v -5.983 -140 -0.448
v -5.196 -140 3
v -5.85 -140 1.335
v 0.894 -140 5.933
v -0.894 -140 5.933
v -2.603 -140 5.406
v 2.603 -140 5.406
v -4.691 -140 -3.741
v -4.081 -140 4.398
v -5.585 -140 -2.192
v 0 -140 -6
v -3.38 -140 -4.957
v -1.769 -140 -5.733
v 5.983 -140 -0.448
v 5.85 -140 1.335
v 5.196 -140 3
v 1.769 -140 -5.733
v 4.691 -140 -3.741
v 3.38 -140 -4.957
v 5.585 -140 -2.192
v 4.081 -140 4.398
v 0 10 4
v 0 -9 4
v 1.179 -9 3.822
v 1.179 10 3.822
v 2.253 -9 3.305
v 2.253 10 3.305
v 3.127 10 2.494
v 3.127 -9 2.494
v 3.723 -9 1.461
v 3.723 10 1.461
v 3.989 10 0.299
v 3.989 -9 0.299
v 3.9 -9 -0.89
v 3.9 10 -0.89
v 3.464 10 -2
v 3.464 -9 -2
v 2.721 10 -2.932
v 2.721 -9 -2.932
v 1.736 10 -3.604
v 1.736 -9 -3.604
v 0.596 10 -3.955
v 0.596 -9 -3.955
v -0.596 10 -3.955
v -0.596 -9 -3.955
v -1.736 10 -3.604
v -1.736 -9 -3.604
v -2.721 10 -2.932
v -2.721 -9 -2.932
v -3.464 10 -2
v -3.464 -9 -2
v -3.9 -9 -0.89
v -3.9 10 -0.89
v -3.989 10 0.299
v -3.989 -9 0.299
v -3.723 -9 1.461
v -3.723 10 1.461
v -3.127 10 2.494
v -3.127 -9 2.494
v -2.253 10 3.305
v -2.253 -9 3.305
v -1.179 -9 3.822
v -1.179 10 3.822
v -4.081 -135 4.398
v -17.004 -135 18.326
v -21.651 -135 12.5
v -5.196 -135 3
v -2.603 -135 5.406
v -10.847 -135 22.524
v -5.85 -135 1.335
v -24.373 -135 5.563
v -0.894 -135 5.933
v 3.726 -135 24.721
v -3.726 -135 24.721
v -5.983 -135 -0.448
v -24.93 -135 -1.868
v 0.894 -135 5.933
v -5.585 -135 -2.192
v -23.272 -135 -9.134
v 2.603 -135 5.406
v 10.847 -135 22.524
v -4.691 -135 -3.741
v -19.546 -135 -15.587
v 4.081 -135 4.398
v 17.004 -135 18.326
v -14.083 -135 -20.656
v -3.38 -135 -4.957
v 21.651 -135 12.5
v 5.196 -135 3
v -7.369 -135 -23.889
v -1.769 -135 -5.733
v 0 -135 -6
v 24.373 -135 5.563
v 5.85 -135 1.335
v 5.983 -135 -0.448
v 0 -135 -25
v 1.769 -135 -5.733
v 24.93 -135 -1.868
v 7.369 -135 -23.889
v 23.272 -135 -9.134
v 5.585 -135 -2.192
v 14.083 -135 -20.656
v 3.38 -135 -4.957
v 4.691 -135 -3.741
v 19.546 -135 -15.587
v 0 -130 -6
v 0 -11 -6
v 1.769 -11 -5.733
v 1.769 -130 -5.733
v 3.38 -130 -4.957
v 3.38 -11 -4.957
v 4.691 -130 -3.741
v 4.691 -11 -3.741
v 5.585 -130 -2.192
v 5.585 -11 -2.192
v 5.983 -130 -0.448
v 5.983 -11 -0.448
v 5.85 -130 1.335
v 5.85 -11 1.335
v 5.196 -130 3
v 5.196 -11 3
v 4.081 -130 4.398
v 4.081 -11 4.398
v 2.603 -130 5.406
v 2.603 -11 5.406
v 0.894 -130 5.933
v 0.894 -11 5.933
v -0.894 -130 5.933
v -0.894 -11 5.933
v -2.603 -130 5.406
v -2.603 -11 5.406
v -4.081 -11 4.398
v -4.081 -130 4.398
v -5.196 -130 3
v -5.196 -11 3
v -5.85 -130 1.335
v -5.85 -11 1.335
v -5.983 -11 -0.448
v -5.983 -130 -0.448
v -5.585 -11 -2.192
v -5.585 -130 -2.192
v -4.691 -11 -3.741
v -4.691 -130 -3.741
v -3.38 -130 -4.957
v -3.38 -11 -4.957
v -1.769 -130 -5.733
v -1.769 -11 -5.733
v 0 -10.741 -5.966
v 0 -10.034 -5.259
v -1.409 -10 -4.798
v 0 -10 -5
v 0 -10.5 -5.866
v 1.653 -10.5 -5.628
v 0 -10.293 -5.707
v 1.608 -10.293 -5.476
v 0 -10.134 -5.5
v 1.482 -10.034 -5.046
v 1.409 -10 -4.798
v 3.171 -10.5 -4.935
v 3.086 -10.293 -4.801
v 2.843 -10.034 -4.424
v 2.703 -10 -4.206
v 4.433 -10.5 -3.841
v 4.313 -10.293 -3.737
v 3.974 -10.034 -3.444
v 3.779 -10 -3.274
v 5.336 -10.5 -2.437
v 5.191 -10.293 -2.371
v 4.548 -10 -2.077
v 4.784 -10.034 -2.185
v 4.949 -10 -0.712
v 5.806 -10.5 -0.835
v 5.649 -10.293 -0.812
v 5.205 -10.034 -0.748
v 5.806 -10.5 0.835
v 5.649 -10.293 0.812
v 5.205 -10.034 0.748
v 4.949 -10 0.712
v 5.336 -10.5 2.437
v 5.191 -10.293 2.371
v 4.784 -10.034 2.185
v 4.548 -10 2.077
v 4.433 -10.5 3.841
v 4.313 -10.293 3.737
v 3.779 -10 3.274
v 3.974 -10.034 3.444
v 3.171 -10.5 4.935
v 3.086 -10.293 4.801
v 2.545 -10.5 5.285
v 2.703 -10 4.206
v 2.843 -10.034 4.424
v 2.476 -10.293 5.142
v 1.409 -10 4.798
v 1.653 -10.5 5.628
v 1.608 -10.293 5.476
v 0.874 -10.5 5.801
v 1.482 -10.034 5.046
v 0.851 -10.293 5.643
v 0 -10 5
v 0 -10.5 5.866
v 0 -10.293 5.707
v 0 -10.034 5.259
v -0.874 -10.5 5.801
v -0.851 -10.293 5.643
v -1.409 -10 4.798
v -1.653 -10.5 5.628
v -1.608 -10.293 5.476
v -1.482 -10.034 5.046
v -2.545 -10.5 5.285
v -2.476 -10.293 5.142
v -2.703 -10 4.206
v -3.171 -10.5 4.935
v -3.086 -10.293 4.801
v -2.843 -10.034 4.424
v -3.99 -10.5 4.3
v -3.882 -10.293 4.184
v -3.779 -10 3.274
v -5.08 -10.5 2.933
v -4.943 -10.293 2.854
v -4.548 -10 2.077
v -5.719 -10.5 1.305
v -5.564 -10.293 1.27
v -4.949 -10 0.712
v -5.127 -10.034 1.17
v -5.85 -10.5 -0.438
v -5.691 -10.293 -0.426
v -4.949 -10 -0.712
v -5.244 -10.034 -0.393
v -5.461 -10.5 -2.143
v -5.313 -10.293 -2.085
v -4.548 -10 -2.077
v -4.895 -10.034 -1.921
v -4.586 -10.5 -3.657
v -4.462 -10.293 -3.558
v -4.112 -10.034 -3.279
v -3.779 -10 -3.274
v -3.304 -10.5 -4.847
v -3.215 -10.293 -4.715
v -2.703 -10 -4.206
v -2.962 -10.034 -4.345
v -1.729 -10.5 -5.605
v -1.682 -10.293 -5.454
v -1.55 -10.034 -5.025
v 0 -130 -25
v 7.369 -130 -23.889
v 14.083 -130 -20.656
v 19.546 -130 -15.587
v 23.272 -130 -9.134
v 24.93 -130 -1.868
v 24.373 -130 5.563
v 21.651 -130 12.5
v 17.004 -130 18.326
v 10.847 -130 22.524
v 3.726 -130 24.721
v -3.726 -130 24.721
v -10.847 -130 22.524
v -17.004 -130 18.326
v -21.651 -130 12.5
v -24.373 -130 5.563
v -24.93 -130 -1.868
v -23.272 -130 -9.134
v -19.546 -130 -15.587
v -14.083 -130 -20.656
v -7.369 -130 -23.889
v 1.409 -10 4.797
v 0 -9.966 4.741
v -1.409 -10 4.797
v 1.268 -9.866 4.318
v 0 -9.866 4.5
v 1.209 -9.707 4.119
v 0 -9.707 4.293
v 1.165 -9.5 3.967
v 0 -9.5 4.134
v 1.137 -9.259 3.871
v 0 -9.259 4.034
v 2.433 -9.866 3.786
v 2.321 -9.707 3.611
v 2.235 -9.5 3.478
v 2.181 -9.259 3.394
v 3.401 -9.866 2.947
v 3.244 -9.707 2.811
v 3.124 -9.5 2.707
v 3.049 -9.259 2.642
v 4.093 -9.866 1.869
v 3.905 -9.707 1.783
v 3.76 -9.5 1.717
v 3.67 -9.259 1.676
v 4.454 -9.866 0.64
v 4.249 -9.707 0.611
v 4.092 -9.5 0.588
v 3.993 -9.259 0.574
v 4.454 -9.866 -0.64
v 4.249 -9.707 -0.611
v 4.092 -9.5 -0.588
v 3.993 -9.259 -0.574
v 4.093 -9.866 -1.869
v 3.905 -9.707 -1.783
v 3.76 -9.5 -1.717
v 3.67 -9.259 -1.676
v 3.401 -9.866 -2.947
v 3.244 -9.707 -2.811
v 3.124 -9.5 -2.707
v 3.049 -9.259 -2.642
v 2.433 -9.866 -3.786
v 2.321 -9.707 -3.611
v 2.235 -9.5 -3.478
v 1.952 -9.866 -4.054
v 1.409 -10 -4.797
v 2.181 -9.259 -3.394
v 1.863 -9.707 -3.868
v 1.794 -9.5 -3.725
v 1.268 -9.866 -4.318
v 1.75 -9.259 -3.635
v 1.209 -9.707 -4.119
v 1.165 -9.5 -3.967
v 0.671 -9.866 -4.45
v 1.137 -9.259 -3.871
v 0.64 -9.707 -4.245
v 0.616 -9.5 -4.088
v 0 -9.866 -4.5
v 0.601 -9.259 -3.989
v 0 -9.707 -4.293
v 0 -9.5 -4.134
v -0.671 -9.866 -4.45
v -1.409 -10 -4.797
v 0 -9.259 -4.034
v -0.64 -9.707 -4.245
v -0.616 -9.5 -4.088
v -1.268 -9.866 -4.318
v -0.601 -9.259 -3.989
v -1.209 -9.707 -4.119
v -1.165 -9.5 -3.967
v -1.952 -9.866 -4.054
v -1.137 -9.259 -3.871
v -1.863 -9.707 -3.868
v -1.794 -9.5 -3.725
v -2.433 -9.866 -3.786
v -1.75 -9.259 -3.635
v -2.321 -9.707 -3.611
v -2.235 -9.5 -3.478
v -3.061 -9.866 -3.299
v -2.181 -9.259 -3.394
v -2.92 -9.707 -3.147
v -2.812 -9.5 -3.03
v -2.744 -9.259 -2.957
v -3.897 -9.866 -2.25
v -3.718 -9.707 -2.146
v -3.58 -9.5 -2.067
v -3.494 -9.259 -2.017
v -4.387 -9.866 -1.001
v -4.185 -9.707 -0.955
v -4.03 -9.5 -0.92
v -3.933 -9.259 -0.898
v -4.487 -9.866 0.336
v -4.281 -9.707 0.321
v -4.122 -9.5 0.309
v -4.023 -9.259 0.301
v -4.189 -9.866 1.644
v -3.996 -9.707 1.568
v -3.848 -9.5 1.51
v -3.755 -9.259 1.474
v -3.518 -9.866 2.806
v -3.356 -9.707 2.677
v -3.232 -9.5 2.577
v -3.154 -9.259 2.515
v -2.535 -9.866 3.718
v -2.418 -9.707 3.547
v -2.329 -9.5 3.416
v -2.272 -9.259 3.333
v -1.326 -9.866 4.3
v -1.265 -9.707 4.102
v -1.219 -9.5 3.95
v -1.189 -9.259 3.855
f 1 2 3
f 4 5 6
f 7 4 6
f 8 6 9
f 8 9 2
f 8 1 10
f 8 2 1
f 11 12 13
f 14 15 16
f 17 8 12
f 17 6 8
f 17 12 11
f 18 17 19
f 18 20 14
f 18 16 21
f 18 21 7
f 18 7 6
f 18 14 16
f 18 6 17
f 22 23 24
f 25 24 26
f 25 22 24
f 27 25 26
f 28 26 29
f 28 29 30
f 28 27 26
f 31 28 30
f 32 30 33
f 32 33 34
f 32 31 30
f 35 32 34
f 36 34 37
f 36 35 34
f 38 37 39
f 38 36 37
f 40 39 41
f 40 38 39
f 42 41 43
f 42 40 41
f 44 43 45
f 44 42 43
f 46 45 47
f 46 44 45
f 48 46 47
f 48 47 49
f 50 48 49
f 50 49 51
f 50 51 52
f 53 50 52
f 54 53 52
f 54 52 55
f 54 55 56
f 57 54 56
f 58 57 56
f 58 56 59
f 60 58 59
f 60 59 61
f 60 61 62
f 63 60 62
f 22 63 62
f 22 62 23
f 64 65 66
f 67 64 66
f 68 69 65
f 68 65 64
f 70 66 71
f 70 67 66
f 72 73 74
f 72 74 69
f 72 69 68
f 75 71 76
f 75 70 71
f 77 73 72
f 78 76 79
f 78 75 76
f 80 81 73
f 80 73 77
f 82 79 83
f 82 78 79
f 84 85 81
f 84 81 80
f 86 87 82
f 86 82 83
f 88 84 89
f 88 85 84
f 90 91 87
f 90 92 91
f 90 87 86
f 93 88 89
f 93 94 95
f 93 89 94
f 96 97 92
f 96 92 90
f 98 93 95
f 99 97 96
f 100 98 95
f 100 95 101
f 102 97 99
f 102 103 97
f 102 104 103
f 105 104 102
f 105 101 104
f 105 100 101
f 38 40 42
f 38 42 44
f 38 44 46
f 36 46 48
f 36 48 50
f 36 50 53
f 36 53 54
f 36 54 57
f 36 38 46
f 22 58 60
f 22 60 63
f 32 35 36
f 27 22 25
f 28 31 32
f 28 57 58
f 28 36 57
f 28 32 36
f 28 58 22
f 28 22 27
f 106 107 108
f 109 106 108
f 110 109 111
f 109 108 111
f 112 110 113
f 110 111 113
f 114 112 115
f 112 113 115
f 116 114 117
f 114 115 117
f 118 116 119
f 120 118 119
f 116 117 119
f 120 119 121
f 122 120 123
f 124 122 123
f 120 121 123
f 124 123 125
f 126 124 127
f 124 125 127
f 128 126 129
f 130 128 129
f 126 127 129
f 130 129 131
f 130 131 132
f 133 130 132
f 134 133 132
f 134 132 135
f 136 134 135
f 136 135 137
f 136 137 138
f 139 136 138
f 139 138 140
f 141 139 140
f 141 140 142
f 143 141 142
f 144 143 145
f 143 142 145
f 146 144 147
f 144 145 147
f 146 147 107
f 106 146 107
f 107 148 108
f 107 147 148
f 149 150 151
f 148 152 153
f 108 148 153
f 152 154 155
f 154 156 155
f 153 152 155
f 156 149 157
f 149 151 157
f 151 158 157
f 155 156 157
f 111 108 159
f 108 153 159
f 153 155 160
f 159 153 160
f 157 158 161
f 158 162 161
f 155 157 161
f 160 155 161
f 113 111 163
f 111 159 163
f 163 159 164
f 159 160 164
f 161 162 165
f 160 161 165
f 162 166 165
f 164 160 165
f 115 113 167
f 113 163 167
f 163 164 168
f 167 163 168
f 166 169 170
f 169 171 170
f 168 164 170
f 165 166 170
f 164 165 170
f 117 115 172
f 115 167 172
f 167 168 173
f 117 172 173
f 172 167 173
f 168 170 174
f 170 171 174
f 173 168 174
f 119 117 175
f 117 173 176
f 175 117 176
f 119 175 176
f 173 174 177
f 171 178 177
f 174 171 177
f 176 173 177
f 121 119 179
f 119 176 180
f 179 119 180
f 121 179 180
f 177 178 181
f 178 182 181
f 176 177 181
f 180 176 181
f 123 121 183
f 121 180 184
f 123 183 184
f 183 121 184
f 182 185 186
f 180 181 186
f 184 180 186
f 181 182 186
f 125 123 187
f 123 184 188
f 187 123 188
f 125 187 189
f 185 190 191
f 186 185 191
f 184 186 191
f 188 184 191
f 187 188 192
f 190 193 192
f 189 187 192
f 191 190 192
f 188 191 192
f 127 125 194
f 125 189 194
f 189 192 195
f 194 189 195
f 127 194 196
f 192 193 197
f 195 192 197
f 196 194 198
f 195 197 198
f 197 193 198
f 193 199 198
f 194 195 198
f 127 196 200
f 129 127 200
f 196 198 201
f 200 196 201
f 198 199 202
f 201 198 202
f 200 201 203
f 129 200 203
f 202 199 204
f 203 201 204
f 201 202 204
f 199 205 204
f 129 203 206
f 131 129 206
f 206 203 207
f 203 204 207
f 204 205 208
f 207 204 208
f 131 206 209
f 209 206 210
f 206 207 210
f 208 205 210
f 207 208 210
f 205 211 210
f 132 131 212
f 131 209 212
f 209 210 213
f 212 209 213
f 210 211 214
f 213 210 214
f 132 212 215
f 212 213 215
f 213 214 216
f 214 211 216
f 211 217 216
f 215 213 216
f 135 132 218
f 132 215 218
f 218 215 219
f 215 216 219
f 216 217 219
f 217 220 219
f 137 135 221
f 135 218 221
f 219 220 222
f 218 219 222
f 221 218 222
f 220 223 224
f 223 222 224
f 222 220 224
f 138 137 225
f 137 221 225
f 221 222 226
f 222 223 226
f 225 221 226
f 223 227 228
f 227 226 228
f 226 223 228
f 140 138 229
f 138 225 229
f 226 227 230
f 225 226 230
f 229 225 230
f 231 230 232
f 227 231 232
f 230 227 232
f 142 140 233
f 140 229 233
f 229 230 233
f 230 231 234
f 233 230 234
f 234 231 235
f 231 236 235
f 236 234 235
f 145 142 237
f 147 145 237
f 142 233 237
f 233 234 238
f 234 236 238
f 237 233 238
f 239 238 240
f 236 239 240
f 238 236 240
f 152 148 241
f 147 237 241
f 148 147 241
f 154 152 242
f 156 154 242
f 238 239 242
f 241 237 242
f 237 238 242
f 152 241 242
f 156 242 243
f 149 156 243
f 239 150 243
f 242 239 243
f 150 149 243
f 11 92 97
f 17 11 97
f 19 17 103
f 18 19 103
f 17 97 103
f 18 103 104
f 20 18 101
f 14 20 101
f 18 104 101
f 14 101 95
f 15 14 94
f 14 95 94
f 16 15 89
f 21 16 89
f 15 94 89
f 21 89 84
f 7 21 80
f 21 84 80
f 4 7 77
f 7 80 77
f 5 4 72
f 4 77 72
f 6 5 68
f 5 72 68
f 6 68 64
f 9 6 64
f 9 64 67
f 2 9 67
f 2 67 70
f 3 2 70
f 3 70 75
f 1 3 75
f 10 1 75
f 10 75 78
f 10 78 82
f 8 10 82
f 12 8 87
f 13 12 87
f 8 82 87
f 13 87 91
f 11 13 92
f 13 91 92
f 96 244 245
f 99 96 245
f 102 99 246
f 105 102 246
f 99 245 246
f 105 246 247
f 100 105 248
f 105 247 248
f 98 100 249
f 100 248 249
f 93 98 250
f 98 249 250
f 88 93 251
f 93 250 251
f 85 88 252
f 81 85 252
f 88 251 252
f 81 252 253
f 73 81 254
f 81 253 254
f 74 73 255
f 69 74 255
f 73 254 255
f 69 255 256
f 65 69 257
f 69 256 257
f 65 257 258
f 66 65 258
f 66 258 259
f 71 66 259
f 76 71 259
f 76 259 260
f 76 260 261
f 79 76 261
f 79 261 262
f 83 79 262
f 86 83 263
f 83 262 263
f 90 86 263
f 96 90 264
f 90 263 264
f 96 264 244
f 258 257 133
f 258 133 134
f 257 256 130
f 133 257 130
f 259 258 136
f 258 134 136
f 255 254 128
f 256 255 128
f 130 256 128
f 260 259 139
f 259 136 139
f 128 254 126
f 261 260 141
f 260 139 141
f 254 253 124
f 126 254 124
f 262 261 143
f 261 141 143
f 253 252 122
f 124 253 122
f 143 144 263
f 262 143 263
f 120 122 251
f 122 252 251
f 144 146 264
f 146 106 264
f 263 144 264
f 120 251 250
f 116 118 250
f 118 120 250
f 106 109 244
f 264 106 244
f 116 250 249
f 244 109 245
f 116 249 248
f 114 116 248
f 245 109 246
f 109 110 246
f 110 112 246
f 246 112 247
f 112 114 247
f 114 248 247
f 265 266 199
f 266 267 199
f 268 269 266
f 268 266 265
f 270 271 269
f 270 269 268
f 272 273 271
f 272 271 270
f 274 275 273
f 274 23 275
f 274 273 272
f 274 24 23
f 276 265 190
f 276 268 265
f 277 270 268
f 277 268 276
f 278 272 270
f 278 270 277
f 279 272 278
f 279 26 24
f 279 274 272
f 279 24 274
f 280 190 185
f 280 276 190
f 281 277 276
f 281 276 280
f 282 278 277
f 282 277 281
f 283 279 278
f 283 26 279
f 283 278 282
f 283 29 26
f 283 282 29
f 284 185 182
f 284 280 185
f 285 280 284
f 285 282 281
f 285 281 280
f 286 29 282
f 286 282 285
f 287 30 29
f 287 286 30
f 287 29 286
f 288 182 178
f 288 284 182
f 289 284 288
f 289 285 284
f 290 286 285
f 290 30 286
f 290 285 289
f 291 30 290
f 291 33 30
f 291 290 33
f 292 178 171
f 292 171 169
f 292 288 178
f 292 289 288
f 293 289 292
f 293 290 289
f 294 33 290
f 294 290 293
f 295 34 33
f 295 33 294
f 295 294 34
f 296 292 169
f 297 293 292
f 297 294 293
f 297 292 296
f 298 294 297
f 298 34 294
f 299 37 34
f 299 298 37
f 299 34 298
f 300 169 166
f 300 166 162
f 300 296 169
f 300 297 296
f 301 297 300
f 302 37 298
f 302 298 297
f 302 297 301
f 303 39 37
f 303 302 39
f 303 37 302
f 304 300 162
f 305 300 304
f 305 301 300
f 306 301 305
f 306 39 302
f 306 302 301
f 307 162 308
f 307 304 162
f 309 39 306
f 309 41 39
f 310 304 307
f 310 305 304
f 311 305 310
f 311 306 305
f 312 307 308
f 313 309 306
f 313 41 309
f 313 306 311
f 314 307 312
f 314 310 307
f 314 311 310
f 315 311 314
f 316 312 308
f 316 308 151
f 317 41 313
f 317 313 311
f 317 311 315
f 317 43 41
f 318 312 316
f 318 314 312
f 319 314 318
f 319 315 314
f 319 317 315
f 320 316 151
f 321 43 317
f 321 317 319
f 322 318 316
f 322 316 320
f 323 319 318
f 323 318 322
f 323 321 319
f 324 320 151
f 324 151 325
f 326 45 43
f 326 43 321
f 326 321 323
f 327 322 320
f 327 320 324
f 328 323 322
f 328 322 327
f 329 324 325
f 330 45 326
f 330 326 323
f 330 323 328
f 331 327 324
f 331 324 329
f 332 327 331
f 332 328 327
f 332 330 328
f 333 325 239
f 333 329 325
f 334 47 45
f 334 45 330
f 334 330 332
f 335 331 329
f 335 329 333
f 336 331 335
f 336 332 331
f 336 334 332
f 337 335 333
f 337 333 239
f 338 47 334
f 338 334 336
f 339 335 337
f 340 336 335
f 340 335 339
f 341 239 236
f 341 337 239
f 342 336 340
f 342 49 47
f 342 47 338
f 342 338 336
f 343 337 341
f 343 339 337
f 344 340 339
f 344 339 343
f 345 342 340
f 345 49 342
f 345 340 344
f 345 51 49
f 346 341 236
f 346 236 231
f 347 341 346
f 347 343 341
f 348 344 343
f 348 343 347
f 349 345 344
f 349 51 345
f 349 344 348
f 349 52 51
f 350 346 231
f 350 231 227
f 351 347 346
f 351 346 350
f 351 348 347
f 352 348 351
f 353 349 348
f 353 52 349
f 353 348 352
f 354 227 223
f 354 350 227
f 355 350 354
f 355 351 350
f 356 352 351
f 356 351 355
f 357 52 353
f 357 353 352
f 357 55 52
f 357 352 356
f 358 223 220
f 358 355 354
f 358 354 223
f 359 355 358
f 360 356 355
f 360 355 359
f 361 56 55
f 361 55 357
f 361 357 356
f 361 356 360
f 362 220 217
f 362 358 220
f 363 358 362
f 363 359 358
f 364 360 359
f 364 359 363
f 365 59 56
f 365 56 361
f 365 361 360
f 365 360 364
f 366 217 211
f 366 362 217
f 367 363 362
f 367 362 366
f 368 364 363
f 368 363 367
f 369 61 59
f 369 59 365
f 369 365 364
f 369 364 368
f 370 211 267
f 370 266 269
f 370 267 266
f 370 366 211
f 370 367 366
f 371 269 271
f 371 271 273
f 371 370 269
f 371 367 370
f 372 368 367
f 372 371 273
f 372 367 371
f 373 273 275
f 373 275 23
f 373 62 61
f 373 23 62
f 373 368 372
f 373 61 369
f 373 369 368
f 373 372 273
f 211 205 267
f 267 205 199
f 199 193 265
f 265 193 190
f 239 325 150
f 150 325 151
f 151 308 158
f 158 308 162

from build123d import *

# Parameters (mm, degrees)
SKETCH1_R           = 4
BOSS_EXTRUDE1_DEPTH = 10
SKETCH2_R           = 6
BOSS_EXTRUDE2_DEPTH = 120
SKETCH3_R           = 25
BOSS_EXTRUDE3_DEPTH = 5
SKETCH4_R           = 6
BOSS_EXTRUDE4_DEPTH = 5
FILLET2_R           = 1


with BuildPart() as part:
    # Sketch1 → Boss-Extrude1 (new, symmetric)
    with BuildSketch(Plane(origin=(0, 0, 0), x_dir=(1, 0, 0), z_dir=(0, 1, 0))):
        with Locations(Location((0, 0, 0), (0, 0, 270))):
            Circle(SKETCH1_R)
    extrude(amount=BOSS_EXTRUDE1_DEPTH, both=True)

    # Sketch2 → Boss-Extrude2 (add)
    with BuildSketch(Plane.XZ.offset(10)):
        with Locations(Location((0, 0, 0), (0, 0, 270))):
            Circle(SKETCH2_R)
    extrude(amount=BOSS_EXTRUDE2_DEPTH)

    # Sketch3 → Boss-Extrude3 (add)
    with BuildSketch(Plane.XZ.offset(130)):
        with Locations(Location((0, 0, 0), (0, 0, 270))):
            Circle(SKETCH3_R)
    extrude(amount=BOSS_EXTRUDE3_DEPTH)

    # Sketch4 → Boss-Extrude4 (add)
    with BuildSketch(Plane.XZ.offset(135)):
        with Locations(Location((0, 0, 0), (0, 0, 270))):
            Circle(SKETCH4_R)
    extrude(amount=BOSS_EXTRUDE4_DEPTH)

    # Fillet2
    fillet2_edges = [part.edges().sort_by_distance(p)[0] for p in [
        (0, -10, -4),
        (0, -10, 6),
    ]]
    fillet(fillet2_edges, radius=FILLET2_R - 0.0001)  # a hair under: the kernel refuses the full size


solid = part.part
